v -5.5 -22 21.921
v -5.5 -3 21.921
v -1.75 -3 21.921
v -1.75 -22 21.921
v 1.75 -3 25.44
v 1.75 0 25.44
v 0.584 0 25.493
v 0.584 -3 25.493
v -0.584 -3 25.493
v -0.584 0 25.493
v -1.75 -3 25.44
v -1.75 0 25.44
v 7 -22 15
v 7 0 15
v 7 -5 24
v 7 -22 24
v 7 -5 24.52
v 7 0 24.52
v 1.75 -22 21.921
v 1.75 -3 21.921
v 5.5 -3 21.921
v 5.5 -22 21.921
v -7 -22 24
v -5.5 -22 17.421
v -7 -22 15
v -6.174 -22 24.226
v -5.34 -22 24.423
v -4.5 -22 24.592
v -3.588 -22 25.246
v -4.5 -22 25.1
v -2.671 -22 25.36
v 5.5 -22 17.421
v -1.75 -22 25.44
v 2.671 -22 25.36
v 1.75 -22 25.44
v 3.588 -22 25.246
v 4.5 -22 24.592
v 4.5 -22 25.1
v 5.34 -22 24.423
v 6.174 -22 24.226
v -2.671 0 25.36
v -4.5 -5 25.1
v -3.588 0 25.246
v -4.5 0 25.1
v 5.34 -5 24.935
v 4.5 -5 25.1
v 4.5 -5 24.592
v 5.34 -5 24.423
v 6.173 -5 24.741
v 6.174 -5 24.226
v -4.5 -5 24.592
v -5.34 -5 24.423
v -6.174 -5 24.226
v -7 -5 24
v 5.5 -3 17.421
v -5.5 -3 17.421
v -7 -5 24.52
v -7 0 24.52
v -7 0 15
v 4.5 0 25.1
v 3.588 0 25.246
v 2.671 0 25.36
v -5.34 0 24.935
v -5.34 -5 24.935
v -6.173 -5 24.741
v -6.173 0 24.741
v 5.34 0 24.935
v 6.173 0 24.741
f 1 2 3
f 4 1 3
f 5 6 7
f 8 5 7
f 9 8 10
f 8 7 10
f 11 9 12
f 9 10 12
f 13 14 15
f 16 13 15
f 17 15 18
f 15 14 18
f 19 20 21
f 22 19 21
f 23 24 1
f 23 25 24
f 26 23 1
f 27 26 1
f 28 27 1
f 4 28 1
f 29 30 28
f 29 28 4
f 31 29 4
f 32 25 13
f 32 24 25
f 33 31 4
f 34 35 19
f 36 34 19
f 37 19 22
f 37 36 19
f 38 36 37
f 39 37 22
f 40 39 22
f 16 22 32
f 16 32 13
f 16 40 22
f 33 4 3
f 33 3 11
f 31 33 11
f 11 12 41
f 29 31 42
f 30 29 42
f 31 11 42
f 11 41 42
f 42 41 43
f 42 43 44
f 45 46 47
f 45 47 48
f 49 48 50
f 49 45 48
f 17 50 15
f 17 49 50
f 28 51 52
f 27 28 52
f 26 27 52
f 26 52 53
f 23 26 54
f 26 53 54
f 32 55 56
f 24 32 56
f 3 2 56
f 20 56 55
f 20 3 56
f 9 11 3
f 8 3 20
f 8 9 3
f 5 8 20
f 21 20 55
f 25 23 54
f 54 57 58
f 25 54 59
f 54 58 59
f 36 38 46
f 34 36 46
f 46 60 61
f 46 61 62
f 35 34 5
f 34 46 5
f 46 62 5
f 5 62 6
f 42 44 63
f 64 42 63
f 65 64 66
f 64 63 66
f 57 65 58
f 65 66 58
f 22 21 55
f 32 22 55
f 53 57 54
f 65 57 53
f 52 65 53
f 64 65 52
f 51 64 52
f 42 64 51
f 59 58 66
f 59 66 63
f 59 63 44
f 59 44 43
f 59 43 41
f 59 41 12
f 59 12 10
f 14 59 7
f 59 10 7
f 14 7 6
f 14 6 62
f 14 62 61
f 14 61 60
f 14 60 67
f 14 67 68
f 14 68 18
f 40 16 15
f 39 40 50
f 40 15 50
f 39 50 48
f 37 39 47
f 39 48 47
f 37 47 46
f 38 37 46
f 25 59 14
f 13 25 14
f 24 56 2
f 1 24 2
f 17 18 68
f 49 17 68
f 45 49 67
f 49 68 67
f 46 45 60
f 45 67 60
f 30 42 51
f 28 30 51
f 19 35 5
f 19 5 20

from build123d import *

# Parameters (mm, degrees)
F1_DEPTH = 22
F2_DEPTH = 5
F3_DEPTH = 5
F4_DEPTH = 3


with BuildPart() as f1:
    # F0 (on Front) → F1 (new body)
    with BuildSketch(Plane.XZ):
        with BuildLine():
            Line((4.5, 24.591665), (4.5, 25.099801))
            ThreePointArc((4.5, 25.099801), (3.129623, 25.307222), (1.75, 25.43988))
            Line((1.75, 25.43988), (1.75, 21.921448))
            Line((1.75, 21.921448), (2, 21.921448))
            Line((2, 21.921448), (5.499875, 21.921448))
            Line((5.499875, 21.921448), (5.499875, 17.421448))
            Line((5.499875, 17.421448), (0, 17.421448))
            Line((0, 17.421448), (-5.499875, 17.421448))
            Line((-5.499875, 17.421448), (-5.499875, 21.921448))
            Line((-5.499875, 21.921448), (-2, 21.921448))
            Line((-2, 21.921448), (-1.75, 21.921448))
            Line((-1.75, 21.921448), (-1.75, 25.43988))
            ThreePointArc((-1.75, 25.43988), (-3.129623, 25.307222), (-4.5, 25.099801))
            Line((-4.5, 25.099801), (-4.5, 24.591665))
            ThreePointArc((-4.5, 24.591665), (-5.757605, 24.327967), (-7, 24))
            Line((-7, 24), (-7, 15))
            Line((-7, 15), (0, 15))
            Line((0, 15), (7, 15))
            Line((7, 15), (7, 24))
            ThreePointArc((7, 24), (5.757605, 24.327967), (4.5, 24.591665))
        make_face()
    extrude(amount=F1_DEPTH)

    # F0 (on Front) → F2 (join)
    with BuildSketch(Plane.XZ):
        with BuildLine():
            Line((-4.5, 24.591665), (-4.5, 25.099801))
            ThreePointArc((-4.5, 25.099801), (-5.757293, 24.841569), (-7, 24.5204))
            Line((-7, 24.5204), (-7, 24))
            ThreePointArc((-7, 24), (-5.757605, 24.327967), (-4.5, 24.591665))
        make_face()
    extrude(amount=F2_DEPTH)

    # F0 (on Front) → F3 (join)
    with BuildSketch(Plane.XZ):
        with BuildLine():
            Line((7, 24), (7, 24.5204))
            ThreePointArc((7, 24.5204), (5.757293, 24.841569), (4.5, 25.099801))
            Line((4.5, 25.099801), (4.5, 24.591665))
            ThreePointArc((4.5, 24.591665), (5.757605, 24.327967), (7, 24))
        make_face()
    extrude(amount=F3_DEPTH)

    # F0 (on Front) → F4 (join)
    with BuildSketch(Plane.XZ):
        with BuildLine():
            Line((1.75, 21.921448), (1.75, 25.43988))
            ThreePointArc((1.75, 25.43988), (0, 25.5), (-1.75, 25.43988))
            Line((-1.75, 25.43988), (-1.75, 21.921448))
            Line((-1.75, 21.921448), (-2, 21.921448))
            Line((-2, 21.921448), (-5.499875, 21.921448))
            Line((-5.499875, 21.921448), (-5.499875, 17.421448))
            Line((-5.499875, 17.421448), (0, 17.421448))
            Line((0, 17.421448), (5.499875, 17.421448))
            Line((5.499875, 17.421448), (5.499875, 21.921448))
            Line((5.499875, 21.921448), (2, 21.921448))
            Line((2, 21.921448), (1.75, 21.921448))
        make_face()
    extrude(amount=F4_DEPTH)


solid = f1.part
